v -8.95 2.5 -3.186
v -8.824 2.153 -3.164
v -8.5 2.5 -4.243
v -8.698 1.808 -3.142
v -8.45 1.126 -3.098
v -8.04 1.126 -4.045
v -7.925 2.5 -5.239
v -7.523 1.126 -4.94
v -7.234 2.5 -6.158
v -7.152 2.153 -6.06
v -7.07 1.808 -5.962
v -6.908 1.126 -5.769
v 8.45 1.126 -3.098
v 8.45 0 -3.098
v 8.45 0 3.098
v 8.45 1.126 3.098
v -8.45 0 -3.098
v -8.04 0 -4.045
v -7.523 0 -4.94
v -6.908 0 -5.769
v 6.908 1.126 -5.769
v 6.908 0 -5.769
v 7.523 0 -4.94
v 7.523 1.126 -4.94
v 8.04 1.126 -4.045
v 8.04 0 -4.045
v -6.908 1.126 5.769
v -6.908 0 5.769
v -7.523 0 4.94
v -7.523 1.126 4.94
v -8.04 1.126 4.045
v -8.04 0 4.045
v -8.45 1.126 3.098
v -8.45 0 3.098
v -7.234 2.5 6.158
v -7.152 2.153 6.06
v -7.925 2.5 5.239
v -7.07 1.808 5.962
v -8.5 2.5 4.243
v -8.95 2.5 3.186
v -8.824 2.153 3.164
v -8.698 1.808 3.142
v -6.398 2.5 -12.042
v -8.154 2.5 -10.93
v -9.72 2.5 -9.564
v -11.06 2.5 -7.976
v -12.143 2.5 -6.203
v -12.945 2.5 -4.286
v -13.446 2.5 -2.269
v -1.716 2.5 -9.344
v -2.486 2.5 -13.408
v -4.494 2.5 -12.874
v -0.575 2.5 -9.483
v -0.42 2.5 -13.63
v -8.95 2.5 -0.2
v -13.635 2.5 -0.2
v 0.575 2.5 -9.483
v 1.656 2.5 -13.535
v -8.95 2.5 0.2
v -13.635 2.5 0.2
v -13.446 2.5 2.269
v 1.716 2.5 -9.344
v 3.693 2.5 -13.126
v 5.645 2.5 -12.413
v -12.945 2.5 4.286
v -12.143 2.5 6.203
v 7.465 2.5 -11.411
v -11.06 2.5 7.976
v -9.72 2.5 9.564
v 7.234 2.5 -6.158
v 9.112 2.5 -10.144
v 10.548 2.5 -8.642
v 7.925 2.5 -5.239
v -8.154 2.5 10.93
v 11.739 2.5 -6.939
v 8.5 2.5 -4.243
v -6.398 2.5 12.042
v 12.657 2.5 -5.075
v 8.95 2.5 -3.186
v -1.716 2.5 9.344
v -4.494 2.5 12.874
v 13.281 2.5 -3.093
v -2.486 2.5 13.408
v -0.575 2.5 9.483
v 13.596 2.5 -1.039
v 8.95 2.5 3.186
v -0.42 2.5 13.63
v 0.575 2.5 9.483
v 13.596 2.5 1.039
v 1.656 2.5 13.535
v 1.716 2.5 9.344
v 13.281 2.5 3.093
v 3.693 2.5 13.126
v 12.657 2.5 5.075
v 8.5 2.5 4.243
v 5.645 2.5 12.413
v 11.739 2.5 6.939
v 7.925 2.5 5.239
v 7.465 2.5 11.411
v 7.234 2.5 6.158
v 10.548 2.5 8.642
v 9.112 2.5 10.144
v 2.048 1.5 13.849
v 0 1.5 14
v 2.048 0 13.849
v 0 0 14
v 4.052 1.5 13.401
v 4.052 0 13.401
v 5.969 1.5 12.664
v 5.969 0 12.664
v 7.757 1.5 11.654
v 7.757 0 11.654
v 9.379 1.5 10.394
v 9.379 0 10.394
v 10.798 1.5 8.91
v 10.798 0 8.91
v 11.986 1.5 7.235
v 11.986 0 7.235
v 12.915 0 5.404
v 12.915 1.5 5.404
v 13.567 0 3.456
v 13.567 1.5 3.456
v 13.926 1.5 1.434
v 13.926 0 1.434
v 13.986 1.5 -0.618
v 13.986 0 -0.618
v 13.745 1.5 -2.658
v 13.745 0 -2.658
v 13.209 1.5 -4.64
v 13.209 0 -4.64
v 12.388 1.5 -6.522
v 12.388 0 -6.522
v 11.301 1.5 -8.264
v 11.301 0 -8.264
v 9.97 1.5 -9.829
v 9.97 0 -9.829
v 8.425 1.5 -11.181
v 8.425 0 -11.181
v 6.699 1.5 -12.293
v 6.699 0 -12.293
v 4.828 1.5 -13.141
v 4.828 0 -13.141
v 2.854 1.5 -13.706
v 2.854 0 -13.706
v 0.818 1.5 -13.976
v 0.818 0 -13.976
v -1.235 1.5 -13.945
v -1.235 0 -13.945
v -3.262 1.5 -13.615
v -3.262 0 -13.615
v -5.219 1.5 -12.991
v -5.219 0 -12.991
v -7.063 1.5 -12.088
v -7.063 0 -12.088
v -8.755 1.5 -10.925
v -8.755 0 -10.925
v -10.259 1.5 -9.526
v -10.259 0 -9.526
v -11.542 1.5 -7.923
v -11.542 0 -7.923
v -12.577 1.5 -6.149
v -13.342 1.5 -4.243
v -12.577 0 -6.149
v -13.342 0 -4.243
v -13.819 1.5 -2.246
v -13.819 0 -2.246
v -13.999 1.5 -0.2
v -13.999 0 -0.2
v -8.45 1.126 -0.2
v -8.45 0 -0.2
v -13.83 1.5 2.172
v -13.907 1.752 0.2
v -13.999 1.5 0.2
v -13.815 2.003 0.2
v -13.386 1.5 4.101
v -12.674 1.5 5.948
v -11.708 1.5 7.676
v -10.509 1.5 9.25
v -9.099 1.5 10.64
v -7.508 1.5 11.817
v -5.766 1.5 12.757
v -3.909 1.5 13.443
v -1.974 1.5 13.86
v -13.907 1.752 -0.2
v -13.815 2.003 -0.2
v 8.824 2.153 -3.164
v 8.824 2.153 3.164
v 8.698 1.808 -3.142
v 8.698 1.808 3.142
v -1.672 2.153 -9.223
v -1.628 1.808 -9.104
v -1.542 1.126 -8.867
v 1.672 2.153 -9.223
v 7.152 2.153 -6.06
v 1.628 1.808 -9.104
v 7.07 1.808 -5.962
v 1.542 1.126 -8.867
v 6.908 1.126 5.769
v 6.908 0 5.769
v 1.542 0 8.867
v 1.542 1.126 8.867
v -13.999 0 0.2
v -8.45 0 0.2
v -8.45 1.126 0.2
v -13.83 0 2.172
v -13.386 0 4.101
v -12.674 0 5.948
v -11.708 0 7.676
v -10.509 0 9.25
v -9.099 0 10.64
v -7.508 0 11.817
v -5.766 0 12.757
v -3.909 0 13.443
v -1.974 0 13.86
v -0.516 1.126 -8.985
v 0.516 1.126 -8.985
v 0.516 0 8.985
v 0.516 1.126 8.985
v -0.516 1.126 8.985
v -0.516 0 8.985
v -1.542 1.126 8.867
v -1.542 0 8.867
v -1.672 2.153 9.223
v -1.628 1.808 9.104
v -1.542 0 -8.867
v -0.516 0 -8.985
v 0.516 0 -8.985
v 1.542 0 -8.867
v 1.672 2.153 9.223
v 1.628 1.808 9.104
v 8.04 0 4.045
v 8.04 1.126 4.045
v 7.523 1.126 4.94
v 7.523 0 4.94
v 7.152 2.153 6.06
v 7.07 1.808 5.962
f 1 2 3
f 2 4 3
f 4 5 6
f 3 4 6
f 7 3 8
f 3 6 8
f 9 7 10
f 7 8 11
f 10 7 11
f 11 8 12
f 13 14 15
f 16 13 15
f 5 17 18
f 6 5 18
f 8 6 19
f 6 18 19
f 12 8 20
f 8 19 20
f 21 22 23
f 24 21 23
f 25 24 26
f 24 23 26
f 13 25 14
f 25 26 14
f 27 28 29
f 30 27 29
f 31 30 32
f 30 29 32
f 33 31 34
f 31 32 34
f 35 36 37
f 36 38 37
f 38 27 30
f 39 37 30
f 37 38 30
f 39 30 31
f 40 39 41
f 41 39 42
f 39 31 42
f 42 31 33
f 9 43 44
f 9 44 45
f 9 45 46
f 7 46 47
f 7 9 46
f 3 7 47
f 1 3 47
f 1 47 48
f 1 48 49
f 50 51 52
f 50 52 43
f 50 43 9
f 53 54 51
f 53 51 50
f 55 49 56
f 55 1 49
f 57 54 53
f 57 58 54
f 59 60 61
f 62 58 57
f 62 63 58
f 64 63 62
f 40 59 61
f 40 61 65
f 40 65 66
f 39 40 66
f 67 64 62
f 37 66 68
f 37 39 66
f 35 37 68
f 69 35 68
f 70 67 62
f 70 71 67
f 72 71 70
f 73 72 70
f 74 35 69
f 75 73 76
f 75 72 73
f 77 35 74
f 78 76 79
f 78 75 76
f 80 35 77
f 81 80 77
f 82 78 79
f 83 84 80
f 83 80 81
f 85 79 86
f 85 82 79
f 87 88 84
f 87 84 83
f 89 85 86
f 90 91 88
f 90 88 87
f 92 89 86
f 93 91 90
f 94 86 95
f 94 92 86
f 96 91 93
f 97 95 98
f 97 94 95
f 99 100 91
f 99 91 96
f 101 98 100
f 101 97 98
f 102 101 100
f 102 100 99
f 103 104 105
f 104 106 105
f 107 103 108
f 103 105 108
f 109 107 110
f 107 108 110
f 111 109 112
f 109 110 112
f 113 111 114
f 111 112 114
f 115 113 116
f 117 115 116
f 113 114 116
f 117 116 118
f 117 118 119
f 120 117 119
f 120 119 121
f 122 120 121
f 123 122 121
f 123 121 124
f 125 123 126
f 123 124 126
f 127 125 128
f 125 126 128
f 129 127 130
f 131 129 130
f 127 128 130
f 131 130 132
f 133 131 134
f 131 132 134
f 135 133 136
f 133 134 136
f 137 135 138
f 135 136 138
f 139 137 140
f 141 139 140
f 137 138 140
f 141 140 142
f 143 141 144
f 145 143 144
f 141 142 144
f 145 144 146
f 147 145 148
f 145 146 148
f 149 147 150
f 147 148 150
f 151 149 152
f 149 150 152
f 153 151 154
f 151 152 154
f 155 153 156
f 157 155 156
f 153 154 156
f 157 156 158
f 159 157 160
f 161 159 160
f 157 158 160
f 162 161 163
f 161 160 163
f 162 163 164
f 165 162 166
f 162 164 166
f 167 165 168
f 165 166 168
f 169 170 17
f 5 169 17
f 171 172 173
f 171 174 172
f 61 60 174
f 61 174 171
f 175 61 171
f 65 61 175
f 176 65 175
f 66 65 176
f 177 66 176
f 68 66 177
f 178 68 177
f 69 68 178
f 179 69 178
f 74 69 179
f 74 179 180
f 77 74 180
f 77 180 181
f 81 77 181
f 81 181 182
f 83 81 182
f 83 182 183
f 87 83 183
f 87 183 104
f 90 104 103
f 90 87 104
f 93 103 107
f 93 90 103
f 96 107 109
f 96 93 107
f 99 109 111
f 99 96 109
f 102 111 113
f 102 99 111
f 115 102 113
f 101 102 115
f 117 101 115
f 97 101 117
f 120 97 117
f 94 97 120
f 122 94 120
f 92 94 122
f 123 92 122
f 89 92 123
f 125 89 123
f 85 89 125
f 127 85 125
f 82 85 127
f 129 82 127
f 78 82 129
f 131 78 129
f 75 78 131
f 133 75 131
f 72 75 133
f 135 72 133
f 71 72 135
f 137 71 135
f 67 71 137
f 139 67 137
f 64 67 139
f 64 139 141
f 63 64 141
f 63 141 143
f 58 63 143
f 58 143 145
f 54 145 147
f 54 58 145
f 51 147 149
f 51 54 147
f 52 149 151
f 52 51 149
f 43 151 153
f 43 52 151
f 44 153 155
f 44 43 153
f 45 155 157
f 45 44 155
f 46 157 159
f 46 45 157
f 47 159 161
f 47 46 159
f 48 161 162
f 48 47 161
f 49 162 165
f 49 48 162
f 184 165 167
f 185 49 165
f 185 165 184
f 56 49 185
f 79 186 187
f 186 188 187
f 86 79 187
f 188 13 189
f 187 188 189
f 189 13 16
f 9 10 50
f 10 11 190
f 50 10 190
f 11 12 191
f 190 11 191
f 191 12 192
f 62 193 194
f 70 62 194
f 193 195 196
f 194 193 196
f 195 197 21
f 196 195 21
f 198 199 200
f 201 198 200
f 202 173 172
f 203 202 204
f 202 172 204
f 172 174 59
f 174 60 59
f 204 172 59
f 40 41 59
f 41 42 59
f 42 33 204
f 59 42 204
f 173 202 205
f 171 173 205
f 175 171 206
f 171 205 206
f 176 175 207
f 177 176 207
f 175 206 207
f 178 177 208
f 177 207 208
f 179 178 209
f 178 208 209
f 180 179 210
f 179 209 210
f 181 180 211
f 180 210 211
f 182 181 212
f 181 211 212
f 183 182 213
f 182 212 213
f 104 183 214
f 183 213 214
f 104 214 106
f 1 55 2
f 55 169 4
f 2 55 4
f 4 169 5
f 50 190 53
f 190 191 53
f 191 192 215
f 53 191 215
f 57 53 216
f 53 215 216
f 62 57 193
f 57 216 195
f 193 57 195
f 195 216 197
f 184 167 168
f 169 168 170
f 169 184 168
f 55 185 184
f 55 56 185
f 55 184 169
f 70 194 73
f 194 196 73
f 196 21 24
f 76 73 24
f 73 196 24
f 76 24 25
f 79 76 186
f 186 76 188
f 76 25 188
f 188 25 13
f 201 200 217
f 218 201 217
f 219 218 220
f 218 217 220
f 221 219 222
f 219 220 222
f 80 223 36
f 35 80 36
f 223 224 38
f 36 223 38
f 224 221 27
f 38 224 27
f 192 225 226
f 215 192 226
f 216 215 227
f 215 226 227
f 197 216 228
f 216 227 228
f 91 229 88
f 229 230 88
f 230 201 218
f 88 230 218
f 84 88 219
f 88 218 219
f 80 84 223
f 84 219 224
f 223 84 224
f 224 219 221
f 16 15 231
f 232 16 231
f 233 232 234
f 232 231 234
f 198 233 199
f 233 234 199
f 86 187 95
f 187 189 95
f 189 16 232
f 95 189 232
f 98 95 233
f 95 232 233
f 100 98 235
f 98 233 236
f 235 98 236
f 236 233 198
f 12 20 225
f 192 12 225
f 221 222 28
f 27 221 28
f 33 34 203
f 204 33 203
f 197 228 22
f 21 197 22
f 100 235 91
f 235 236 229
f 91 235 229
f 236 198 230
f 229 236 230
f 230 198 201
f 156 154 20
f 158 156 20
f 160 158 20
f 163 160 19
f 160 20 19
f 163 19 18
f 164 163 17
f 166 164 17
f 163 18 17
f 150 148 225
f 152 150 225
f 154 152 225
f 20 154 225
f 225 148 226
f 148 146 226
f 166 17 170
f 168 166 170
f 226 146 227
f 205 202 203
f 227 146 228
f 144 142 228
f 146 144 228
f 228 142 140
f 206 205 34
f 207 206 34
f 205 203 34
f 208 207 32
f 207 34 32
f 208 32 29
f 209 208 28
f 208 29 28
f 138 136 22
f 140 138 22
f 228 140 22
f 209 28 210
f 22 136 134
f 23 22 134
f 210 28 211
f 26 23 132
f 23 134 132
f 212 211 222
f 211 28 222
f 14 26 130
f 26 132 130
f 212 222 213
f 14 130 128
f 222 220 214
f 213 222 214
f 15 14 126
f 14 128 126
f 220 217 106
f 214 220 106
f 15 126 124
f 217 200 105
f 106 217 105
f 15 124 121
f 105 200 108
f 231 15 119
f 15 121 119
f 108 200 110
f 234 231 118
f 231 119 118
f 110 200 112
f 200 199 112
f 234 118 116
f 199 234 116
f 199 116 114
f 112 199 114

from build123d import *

# Parameters (mm, degrees)
SKETCH_1_R          = 14
EXTRUDE_1_DEPTH     = 2.5
CHAMFER_4_SIZE      = 0.5
CHAMFER_4_SIZE2     = 1.37373871
SKETCH_3_W          = 19.861324318
SKETCH_3_H          = 0.4
CUT_EXTRUDE_1_DEPTH = 20.956202044
CHAMFER_5_SIZE      = 1
CHAMFER_5_SIZE2     = 0.363970234


with BuildPart() as part:
    # Эскиз1 → Бобышка-Вытянуть1 (new body)
    with BuildSketch(Plane(origin=(0, 0, 0), x_dir=(1, 0, 0), z_dir=(0, 1, 0))):
        with Locations(Location((0, -1e-09, 0), (0, 0, 270))):
            Circle(SKETCH_1_R)
        with BuildLine():
            Line((-6.907932165, 5.768923055), (-1.542067835, 8.866906269))
            ThreePointArc((-1.542067835, 8.866906269), (0, 9), (1.542067835, 8.866906269))
            Line((1.542067835, 8.866906269), (6.907932165, 5.768923055))
            ThreePointArc((6.907932165, 5.768923055), (7.794228634, 4.5), (8.45, 3.097983215))
            Line((8.45, 3.097983215), (8.45, -3.097983215))
            ThreePointArc((8.45, -3.097983215), (7.794228634, -4.5), (6.907932165, -5.768923055))
            Line((6.907932165, -5.768923055), (1.542067835, -8.866906269))
            ThreePointArc((1.542067835, -8.866906269), (0, -9), (-1.542067835, -8.866906269))
            Line((-1.542067835, -8.866906269), (-6.907932165, -5.768923054))
            ThreePointArc((-6.907932165, -5.768923054), (-7.794228634, -4.5), (-8.45, -3.097983215))
            Line((-8.45, -3.097983215), (-8.45, 3.097983215))
            ThreePointArc((-8.45, 3.097983215), (-7.794228634, 4.5), (-6.907932165, 5.768923055))
        make_face(mode=Mode.SUBTRACT)
    extrude(amount=EXTRUDE_1_DEPTH)

    # Фаска4
    chamfer_4_edges = [part.edges().sort_by_distance(p)[0] for p in [
        (-7.794228634, 2.5, -4.5),
        (-8.45, 2.5, 0),
        (-7.794228634, 2.5, 4.5),
        (-4.225, 2.5, 7.317914662),
        (0, 2.5, 9),
        (4.225, 2.5, 7.317914662),
        (7.794228634, 2.5, 4.5),
        (8.45, 2.5, 0),
        (7.794228634, 2.5, -4.5),
        (4.225, 2.5, -7.317914662),
        (0, 2.5, -9),
        (-4.225, 2.5, -7.317914662),
    ]]
    chamfer_4_side = [part.faces().sort_by_distance(p)[0] for p in [
        (0, 2.5, -13.604020202),
    ]]
    chamfer(chamfer_4_edges, length=CHAMFER_4_SIZE, length2=CHAMFER_4_SIZE2, reference=chamfer_4_side[0])

    # Эскиз3 → Вырез-Вытянуть1 (cut, through all)
    with BuildSketch(Plane(origin=(0, 2.5, 0), x_dir=(1, 0, 0), z_dir=(0, 1, 0))):
        with Locations((-7.474129941, 0)):
            Rectangle(SKETCH_3_W, SKETCH_3_H)
    extrude(amount=-CUT_EXTRUDE_1_DEPTH, mode=Mode.SUBTRACT)

    # Фаска5
    chamfer_5_edges = [part.edges().sort_by_distance(p)[0] for p in [
        (9.969954865, 2.5, -9.828529899),
    ]]
    chamfer_5_side = [part.faces().sort_by_distance(p)[0] for p in [
        (9.969954865, 1.25, -9.828529899),
    ]]
    chamfer(chamfer_5_edges, length=CHAMFER_5_SIZE, length2=CHAMFER_5_SIZE2, reference=chamfer_5_side[0])


solid = part.part
